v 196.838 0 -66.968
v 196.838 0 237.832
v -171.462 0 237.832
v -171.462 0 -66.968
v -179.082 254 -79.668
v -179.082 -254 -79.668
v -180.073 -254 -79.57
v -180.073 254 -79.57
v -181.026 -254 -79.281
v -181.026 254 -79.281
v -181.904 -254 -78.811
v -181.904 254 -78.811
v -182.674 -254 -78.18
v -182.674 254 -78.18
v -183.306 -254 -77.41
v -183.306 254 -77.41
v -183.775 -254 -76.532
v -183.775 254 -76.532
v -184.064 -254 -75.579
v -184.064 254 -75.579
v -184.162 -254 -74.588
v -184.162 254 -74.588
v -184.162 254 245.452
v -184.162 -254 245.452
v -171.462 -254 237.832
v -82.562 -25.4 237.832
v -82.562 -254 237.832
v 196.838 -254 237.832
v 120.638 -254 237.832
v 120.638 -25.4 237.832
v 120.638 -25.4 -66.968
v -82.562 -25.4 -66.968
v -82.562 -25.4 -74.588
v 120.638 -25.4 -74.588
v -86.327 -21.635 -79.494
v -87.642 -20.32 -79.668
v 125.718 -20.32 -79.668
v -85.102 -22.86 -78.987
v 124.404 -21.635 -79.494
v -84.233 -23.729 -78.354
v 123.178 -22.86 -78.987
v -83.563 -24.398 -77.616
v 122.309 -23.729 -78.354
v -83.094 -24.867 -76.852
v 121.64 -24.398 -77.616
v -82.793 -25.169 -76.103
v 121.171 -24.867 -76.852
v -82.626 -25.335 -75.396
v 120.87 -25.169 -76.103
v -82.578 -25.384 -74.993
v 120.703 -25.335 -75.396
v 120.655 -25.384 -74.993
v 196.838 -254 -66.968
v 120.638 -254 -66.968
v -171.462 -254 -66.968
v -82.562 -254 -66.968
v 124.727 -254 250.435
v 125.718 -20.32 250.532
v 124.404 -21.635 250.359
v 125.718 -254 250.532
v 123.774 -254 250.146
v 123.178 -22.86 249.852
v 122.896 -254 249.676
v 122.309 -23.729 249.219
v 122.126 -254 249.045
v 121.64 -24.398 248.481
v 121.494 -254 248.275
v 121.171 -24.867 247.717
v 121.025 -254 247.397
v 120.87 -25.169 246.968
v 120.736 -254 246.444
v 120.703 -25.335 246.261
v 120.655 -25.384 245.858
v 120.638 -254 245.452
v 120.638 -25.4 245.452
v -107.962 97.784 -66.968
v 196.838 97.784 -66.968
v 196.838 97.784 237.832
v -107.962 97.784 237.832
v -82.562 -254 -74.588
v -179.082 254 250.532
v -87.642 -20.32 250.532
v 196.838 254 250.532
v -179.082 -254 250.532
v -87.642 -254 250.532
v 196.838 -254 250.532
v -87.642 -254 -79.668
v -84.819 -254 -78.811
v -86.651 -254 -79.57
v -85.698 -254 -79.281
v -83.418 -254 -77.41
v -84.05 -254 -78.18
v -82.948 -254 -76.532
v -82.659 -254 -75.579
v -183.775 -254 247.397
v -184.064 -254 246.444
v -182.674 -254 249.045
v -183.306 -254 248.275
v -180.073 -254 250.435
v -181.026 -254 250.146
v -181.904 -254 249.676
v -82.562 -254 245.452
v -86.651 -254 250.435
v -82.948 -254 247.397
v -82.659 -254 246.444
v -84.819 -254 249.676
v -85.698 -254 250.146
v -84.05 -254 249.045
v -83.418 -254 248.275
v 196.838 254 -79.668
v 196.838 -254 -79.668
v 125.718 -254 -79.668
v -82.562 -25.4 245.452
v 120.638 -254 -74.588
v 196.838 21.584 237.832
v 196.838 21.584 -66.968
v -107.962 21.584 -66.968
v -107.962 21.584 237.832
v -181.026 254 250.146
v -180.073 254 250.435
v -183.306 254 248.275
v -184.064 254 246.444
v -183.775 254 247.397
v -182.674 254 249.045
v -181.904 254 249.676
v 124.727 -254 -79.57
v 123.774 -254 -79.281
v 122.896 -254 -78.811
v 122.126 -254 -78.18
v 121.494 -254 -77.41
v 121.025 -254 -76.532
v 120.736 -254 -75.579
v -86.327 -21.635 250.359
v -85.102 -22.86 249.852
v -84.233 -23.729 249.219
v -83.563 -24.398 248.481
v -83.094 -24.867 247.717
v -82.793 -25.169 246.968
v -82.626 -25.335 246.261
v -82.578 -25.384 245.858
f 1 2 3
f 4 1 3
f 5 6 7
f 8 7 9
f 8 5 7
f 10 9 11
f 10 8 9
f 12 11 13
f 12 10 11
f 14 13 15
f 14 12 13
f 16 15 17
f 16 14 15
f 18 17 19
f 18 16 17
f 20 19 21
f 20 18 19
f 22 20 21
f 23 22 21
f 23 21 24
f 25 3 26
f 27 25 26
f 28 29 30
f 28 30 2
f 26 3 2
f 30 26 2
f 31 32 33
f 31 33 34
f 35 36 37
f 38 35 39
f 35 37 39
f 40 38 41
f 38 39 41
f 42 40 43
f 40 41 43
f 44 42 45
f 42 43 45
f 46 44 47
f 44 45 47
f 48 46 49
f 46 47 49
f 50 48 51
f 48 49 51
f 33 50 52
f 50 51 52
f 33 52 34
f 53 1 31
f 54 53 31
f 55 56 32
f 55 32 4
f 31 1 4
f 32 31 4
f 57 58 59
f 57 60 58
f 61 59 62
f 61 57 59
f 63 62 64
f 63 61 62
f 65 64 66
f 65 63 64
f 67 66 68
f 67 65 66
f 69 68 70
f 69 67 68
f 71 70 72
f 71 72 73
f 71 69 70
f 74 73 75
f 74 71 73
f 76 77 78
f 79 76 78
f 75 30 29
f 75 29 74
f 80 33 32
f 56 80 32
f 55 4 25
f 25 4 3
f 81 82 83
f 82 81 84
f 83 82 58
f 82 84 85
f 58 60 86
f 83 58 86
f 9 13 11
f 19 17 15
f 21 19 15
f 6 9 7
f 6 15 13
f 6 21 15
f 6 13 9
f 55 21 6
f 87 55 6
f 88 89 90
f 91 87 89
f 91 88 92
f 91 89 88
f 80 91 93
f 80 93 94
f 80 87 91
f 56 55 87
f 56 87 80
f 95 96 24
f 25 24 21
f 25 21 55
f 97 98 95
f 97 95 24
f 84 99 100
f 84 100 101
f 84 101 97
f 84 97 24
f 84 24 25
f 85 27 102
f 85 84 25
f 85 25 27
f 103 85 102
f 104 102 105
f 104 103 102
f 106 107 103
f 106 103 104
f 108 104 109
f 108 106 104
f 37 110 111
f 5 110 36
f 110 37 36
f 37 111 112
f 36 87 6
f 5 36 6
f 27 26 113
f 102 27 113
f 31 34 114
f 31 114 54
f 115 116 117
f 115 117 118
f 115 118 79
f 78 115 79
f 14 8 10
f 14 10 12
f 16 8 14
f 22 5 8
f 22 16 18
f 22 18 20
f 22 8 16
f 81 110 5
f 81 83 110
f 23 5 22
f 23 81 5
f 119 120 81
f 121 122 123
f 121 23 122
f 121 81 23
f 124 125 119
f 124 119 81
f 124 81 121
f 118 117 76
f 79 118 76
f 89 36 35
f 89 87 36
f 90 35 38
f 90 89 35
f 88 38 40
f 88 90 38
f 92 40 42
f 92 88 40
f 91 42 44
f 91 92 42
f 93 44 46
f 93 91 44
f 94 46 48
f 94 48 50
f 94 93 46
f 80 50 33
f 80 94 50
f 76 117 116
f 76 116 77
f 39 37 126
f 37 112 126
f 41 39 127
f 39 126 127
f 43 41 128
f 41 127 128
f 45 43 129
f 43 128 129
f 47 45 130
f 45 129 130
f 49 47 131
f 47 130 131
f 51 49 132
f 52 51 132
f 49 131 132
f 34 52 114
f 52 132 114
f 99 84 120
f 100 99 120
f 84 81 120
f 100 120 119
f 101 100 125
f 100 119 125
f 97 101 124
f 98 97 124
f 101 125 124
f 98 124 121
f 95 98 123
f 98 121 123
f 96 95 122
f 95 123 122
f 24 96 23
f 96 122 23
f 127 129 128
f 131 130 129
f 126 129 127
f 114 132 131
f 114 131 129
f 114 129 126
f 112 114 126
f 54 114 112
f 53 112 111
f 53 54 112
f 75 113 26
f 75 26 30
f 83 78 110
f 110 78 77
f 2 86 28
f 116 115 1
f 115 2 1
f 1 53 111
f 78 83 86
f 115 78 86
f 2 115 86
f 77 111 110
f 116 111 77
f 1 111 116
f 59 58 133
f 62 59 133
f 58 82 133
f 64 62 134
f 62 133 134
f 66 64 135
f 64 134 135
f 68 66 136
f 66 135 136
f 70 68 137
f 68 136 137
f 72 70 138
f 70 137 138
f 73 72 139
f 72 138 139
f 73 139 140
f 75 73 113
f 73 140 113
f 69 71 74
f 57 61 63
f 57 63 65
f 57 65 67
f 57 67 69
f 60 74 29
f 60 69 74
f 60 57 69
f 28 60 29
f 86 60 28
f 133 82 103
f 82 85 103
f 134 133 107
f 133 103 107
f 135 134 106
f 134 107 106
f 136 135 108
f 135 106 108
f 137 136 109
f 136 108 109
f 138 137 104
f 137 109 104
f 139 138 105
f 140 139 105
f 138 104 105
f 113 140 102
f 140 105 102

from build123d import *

# Parameters (mm, degrees)
F1_DEPTH = 25.4
F2_W     = 76.2
F2_H     = 12.7
F3_DEPTH = 228.6
F4_W     = 368.3
F4_H     = 304.8
F5_DEPTH = 254
F6_R     = 5.08
F7_W     = 76.2
F7_H     = 304.8
F8_DEPTH = 304.8


with BuildPart() as f1:
    # F0 (on Front) → F1 (new body)
    with BuildSketch(Plane.XZ):
        Polygon((-171.4616481543, -66.9675160527), (-171.4616481543, 237.8324839473), (196.8383518457, 237.8324839473), (196.8383518457, 250.5324839473), (-184.1616481543, 250.5324839473), (-184.1616481543, -79.6675160527), (196.8383518457, -79.6675160527), (196.8383518457, -66.9675160527), align=None)
    extrude(amount=F1_DEPTH)

    # F2 (on face) → F3 (join)
    with BuildSketch(Plane.XZ.offset(25.4)):
        Polygon((-82.5616481543, 237.8324839473), (-82.5616481543, 250.5324839473), (-184.1616481543, 250.5324839473), (-184.1616481543, -79.6675160527), (-82.5616481543, -79.6675160527), (-82.5616481543, -66.9675160527), (-171.4616481543, -66.9675160527), (-171.4616481543, 237.8324839473), align=None)
        with Locations((158.7383518457, 244.1824839473)):
            Rectangle(F2_W, F2_H)
        with Locations((158.7383518457, -73.3175160527)):
            Rectangle(F2_W, F2_H)
    extrude(amount=F3_DEPTH)

    # F4 (on face) → F5 (join)
    with BuildSketch(Plane(origin=(0, 0, 0), x_dir=(-1, 0, 0), z_dir=(0, 1, 0))):
        with Locations((-12.6883518457, 85.4324839473)):
            Rectangle(F4_W, F4_H)
        Polygon((184.1616481543, 250.5324839473), (-196.8383518457, 250.5324839473), (-196.8383518457, 237.8324839473), (171.4616481543, 237.8324839473), (171.4616481543, -66.9675160527), (-196.8383518457, -66.9675160527), (-196.8383518457, -79.6675160527), (184.1616481543, -79.6675160527), align=None)
    extrude(amount=F5_DEPTH)

    # F6
    f6_edges = [f1.edges().sort_by_distance(p)[0] for p in [
        (-184.161648, 0, -79.667516),
        (-184.161648, 0, 250.532484),
        (-82.561648, -139.7, -79.667516),
        (120.638352, -139.7, -79.667516),
        (19.038352, -25.4, -79.667516),
        (120.638352, -139.7, 250.532484),
        (19.038352, -25.4, 250.532484),
        (-82.561648, -139.7, 250.532484),
    ]]
    fillet(f6_edges, radius=F6_R)

    # F7 (on face) → F8 (cut)
    with BuildSketch(Plane.YZ.offset(196.8383518457)):
        with Locations((59.6839594603, 85.4324839473)):
            Rectangle(F7_W, F7_H)
    extrude(amount=-F8_DEPTH, mode=Mode.SUBTRACT)


solid = f1.part
